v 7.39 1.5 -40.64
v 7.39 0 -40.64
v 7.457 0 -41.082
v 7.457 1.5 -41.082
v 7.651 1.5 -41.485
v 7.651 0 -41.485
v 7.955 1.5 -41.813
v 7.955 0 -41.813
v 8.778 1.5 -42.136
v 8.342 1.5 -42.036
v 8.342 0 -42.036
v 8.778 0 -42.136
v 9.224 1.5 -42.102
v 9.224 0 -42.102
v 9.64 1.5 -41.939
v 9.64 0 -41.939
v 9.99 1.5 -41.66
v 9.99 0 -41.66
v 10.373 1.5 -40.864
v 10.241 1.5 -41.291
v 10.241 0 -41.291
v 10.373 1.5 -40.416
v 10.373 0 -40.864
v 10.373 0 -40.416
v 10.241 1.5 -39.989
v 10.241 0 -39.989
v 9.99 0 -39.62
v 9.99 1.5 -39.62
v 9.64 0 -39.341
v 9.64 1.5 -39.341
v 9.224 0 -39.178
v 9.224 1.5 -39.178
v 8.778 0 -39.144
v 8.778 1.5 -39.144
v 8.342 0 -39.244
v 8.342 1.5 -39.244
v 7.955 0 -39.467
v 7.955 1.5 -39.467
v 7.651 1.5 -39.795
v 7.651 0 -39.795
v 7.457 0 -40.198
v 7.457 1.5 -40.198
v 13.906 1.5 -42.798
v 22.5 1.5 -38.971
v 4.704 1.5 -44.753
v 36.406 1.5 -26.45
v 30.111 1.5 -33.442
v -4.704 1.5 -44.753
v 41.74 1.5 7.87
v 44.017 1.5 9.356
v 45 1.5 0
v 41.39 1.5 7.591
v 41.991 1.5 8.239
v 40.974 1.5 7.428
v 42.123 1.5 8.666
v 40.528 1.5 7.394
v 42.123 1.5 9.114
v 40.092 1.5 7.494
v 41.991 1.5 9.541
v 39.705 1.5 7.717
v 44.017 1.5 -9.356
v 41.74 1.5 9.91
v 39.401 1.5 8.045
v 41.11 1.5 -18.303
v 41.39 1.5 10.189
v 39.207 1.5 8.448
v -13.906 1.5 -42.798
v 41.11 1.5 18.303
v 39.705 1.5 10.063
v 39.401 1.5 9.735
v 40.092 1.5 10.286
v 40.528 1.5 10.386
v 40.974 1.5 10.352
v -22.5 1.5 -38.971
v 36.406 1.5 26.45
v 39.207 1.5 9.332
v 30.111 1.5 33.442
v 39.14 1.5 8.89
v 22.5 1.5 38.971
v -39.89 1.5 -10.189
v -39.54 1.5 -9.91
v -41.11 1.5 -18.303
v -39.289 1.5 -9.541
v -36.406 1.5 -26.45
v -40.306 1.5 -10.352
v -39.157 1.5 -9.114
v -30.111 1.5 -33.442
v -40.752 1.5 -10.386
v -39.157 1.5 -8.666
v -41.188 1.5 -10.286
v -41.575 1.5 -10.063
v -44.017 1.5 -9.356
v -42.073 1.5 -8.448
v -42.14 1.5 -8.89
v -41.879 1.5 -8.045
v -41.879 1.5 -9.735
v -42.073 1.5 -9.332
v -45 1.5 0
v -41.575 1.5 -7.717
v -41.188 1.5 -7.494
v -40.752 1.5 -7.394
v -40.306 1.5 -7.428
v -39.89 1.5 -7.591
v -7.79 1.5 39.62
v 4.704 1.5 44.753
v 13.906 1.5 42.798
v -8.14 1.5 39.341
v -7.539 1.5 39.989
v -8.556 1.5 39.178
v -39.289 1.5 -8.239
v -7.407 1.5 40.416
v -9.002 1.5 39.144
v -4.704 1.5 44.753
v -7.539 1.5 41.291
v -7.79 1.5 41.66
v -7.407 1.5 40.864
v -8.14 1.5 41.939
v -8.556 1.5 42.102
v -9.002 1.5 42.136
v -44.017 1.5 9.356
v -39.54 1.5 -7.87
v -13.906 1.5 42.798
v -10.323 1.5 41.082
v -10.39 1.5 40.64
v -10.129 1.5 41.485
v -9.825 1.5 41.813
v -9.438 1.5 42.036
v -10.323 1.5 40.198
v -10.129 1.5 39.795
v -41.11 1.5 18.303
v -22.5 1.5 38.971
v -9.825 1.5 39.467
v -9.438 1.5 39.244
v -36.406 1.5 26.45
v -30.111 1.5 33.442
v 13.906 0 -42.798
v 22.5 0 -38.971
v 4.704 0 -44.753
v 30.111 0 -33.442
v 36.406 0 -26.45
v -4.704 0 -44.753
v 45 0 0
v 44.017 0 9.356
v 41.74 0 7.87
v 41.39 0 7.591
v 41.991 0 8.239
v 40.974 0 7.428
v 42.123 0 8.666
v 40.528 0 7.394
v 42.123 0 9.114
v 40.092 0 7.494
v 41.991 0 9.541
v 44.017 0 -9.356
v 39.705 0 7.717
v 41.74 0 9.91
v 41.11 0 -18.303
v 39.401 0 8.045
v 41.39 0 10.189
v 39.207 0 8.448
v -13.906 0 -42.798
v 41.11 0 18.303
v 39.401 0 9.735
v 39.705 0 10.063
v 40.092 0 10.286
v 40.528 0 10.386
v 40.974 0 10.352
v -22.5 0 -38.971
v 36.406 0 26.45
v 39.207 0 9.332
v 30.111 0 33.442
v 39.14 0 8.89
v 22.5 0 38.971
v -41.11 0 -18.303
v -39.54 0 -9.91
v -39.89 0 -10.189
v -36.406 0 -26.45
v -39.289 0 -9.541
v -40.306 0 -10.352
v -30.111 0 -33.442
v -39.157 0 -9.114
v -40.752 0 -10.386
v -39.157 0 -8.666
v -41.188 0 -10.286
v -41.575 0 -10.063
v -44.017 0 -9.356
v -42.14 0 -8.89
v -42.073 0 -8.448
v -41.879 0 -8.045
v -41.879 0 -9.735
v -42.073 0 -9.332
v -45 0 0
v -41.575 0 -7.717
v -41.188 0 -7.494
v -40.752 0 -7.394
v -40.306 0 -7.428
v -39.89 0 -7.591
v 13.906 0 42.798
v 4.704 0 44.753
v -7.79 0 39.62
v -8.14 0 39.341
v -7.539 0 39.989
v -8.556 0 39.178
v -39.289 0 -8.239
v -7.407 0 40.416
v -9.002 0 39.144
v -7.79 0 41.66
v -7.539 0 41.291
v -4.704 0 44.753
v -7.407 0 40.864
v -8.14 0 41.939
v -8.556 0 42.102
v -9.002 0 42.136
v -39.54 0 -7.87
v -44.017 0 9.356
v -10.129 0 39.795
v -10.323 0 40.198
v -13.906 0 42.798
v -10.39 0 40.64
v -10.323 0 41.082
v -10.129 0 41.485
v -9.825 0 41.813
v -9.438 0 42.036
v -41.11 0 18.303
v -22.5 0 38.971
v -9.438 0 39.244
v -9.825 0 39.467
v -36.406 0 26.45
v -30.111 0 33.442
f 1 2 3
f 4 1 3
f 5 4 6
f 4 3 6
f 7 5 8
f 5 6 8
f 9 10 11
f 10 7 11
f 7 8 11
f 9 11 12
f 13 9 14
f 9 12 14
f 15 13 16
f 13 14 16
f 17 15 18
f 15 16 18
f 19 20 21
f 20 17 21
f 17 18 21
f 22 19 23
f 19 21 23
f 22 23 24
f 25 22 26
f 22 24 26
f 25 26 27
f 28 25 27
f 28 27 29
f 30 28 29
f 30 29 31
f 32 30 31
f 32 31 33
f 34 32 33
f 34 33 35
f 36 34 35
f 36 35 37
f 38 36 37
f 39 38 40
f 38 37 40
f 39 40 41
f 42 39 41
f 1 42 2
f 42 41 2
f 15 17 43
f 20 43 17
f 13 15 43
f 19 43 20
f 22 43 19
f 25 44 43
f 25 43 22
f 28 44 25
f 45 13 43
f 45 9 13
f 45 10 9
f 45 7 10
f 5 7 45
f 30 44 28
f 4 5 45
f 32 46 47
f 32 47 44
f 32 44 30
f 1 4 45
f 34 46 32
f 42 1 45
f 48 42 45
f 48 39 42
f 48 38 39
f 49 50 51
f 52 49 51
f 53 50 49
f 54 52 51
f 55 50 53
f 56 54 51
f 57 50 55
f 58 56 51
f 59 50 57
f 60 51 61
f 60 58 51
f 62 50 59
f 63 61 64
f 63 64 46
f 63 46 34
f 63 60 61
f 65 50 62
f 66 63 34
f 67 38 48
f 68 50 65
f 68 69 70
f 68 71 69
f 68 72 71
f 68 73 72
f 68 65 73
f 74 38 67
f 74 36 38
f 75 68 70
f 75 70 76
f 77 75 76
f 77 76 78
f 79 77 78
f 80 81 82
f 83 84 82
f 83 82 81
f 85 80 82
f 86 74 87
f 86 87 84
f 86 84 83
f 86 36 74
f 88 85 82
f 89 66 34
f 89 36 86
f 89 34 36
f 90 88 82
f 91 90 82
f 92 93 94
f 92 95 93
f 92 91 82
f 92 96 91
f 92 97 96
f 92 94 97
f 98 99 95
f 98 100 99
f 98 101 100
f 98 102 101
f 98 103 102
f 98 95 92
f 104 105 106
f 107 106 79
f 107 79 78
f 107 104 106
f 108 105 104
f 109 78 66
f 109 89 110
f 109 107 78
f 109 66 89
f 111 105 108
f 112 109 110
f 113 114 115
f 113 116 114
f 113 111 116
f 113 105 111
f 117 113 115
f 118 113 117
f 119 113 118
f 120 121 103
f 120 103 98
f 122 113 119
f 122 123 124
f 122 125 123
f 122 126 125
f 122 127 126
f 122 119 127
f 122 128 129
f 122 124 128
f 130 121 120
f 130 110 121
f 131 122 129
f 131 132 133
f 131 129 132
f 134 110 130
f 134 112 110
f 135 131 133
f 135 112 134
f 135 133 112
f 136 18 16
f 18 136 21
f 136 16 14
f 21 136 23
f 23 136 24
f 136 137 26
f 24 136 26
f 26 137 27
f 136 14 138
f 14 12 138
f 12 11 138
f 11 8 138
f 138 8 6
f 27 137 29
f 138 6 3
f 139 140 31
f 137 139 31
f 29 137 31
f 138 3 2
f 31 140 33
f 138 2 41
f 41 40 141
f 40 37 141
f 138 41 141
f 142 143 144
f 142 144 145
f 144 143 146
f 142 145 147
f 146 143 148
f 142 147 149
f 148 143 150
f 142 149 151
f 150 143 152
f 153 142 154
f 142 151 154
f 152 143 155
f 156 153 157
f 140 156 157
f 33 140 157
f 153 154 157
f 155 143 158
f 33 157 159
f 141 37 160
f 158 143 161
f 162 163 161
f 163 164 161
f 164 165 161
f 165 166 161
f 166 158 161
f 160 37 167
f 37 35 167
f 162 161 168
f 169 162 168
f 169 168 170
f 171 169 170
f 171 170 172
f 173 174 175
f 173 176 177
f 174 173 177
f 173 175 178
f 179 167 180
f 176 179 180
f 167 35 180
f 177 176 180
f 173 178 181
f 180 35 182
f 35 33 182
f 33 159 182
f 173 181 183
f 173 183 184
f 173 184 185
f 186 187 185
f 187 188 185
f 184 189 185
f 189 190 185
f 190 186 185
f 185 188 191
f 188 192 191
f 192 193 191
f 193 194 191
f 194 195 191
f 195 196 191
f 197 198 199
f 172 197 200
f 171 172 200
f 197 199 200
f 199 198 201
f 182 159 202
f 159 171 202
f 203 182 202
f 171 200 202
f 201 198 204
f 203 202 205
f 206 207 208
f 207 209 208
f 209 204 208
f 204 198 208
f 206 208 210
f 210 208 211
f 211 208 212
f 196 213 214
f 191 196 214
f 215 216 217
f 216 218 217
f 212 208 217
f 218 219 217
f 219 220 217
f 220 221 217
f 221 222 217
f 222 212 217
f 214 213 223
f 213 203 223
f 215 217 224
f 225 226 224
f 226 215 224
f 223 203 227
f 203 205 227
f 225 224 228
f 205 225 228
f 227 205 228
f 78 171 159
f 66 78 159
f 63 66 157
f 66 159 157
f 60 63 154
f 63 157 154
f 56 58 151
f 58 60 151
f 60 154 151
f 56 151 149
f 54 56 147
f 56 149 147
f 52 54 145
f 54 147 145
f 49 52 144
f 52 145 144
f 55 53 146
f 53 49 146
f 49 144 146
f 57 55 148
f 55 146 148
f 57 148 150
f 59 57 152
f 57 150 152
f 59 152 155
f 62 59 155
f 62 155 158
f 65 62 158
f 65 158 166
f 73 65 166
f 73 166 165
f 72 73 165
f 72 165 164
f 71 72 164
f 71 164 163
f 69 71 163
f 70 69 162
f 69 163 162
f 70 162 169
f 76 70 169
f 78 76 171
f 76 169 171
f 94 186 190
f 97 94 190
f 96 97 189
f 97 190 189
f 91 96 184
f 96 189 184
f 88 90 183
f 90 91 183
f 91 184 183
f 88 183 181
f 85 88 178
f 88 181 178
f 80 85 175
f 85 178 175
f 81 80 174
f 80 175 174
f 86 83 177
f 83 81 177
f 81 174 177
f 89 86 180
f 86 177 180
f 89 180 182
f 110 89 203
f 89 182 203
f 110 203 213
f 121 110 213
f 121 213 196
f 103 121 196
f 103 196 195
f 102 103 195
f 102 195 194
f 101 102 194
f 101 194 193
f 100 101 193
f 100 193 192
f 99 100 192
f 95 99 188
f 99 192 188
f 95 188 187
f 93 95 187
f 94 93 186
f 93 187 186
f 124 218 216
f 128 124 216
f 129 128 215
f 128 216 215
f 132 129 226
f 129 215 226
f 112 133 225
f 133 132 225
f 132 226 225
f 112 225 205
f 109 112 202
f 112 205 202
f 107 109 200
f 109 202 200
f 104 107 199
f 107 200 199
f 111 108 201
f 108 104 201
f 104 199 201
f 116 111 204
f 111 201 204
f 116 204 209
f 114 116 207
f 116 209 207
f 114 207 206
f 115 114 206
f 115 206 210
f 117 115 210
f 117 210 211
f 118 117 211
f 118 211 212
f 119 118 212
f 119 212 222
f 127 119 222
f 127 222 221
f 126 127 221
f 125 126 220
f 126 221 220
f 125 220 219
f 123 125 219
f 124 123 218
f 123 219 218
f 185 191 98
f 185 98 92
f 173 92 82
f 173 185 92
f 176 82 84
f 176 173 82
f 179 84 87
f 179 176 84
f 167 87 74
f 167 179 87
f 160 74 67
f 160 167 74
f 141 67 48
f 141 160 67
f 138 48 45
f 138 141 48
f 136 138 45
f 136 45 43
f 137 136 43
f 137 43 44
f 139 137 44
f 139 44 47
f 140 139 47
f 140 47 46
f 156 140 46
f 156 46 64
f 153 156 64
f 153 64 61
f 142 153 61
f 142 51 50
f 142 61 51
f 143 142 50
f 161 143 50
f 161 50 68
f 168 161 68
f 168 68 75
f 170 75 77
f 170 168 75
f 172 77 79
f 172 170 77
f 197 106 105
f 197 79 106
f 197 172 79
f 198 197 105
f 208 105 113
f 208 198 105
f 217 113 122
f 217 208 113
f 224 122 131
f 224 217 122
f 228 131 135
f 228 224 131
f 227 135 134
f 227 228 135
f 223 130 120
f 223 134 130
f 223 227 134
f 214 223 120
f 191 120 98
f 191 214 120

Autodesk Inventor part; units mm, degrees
ref_plane "YZ Plane" through (0, 0, 0) normal (1, 0, 0) x (0, 1, 0)
ref_plane "XZ Plane" through (0, 0, 0) normal (0, 1, 0) x (-1, 0, 0)
ref_plane "XY Plane" through (0, 0, 0) normal (0, 0, 1) x (1, 0, 0)
sketch "Sketch1" plane through (0, 0, 0) normal (0, 1, 0) x (-1, 0, 0)
  circle A0 centre (0, 0) radius 45
  line L0 (0, 0) -> (0, -40.64)
  line L1 (0, -40.64) -> (-8.89, -40.64)
  circle A1 centre (-8.89, -40.64) radius 1.5
  circle A2 centre (40.64, -8.89) radius 1.5
  circle A3 centre (8.89, 40.64) radius 1.5
  circle A4 centre (-40.64, 8.89) radius 1.5
  dimension "d0" = 90
  dimension "d1" = 40.64
  dimension "d2" = 8.89
  dimension "d3" = 3
  dimension "d6" = 360
extrude "Extrusion1" add sketch "Sketch1" along normal blind 1.5
sketch "Sketch2" plane through (0, 1.5, 0) normal (0, 1, 0) x (1, 0, 0)
  point P0 (0, 0)
properties part number "Light Sensor"
